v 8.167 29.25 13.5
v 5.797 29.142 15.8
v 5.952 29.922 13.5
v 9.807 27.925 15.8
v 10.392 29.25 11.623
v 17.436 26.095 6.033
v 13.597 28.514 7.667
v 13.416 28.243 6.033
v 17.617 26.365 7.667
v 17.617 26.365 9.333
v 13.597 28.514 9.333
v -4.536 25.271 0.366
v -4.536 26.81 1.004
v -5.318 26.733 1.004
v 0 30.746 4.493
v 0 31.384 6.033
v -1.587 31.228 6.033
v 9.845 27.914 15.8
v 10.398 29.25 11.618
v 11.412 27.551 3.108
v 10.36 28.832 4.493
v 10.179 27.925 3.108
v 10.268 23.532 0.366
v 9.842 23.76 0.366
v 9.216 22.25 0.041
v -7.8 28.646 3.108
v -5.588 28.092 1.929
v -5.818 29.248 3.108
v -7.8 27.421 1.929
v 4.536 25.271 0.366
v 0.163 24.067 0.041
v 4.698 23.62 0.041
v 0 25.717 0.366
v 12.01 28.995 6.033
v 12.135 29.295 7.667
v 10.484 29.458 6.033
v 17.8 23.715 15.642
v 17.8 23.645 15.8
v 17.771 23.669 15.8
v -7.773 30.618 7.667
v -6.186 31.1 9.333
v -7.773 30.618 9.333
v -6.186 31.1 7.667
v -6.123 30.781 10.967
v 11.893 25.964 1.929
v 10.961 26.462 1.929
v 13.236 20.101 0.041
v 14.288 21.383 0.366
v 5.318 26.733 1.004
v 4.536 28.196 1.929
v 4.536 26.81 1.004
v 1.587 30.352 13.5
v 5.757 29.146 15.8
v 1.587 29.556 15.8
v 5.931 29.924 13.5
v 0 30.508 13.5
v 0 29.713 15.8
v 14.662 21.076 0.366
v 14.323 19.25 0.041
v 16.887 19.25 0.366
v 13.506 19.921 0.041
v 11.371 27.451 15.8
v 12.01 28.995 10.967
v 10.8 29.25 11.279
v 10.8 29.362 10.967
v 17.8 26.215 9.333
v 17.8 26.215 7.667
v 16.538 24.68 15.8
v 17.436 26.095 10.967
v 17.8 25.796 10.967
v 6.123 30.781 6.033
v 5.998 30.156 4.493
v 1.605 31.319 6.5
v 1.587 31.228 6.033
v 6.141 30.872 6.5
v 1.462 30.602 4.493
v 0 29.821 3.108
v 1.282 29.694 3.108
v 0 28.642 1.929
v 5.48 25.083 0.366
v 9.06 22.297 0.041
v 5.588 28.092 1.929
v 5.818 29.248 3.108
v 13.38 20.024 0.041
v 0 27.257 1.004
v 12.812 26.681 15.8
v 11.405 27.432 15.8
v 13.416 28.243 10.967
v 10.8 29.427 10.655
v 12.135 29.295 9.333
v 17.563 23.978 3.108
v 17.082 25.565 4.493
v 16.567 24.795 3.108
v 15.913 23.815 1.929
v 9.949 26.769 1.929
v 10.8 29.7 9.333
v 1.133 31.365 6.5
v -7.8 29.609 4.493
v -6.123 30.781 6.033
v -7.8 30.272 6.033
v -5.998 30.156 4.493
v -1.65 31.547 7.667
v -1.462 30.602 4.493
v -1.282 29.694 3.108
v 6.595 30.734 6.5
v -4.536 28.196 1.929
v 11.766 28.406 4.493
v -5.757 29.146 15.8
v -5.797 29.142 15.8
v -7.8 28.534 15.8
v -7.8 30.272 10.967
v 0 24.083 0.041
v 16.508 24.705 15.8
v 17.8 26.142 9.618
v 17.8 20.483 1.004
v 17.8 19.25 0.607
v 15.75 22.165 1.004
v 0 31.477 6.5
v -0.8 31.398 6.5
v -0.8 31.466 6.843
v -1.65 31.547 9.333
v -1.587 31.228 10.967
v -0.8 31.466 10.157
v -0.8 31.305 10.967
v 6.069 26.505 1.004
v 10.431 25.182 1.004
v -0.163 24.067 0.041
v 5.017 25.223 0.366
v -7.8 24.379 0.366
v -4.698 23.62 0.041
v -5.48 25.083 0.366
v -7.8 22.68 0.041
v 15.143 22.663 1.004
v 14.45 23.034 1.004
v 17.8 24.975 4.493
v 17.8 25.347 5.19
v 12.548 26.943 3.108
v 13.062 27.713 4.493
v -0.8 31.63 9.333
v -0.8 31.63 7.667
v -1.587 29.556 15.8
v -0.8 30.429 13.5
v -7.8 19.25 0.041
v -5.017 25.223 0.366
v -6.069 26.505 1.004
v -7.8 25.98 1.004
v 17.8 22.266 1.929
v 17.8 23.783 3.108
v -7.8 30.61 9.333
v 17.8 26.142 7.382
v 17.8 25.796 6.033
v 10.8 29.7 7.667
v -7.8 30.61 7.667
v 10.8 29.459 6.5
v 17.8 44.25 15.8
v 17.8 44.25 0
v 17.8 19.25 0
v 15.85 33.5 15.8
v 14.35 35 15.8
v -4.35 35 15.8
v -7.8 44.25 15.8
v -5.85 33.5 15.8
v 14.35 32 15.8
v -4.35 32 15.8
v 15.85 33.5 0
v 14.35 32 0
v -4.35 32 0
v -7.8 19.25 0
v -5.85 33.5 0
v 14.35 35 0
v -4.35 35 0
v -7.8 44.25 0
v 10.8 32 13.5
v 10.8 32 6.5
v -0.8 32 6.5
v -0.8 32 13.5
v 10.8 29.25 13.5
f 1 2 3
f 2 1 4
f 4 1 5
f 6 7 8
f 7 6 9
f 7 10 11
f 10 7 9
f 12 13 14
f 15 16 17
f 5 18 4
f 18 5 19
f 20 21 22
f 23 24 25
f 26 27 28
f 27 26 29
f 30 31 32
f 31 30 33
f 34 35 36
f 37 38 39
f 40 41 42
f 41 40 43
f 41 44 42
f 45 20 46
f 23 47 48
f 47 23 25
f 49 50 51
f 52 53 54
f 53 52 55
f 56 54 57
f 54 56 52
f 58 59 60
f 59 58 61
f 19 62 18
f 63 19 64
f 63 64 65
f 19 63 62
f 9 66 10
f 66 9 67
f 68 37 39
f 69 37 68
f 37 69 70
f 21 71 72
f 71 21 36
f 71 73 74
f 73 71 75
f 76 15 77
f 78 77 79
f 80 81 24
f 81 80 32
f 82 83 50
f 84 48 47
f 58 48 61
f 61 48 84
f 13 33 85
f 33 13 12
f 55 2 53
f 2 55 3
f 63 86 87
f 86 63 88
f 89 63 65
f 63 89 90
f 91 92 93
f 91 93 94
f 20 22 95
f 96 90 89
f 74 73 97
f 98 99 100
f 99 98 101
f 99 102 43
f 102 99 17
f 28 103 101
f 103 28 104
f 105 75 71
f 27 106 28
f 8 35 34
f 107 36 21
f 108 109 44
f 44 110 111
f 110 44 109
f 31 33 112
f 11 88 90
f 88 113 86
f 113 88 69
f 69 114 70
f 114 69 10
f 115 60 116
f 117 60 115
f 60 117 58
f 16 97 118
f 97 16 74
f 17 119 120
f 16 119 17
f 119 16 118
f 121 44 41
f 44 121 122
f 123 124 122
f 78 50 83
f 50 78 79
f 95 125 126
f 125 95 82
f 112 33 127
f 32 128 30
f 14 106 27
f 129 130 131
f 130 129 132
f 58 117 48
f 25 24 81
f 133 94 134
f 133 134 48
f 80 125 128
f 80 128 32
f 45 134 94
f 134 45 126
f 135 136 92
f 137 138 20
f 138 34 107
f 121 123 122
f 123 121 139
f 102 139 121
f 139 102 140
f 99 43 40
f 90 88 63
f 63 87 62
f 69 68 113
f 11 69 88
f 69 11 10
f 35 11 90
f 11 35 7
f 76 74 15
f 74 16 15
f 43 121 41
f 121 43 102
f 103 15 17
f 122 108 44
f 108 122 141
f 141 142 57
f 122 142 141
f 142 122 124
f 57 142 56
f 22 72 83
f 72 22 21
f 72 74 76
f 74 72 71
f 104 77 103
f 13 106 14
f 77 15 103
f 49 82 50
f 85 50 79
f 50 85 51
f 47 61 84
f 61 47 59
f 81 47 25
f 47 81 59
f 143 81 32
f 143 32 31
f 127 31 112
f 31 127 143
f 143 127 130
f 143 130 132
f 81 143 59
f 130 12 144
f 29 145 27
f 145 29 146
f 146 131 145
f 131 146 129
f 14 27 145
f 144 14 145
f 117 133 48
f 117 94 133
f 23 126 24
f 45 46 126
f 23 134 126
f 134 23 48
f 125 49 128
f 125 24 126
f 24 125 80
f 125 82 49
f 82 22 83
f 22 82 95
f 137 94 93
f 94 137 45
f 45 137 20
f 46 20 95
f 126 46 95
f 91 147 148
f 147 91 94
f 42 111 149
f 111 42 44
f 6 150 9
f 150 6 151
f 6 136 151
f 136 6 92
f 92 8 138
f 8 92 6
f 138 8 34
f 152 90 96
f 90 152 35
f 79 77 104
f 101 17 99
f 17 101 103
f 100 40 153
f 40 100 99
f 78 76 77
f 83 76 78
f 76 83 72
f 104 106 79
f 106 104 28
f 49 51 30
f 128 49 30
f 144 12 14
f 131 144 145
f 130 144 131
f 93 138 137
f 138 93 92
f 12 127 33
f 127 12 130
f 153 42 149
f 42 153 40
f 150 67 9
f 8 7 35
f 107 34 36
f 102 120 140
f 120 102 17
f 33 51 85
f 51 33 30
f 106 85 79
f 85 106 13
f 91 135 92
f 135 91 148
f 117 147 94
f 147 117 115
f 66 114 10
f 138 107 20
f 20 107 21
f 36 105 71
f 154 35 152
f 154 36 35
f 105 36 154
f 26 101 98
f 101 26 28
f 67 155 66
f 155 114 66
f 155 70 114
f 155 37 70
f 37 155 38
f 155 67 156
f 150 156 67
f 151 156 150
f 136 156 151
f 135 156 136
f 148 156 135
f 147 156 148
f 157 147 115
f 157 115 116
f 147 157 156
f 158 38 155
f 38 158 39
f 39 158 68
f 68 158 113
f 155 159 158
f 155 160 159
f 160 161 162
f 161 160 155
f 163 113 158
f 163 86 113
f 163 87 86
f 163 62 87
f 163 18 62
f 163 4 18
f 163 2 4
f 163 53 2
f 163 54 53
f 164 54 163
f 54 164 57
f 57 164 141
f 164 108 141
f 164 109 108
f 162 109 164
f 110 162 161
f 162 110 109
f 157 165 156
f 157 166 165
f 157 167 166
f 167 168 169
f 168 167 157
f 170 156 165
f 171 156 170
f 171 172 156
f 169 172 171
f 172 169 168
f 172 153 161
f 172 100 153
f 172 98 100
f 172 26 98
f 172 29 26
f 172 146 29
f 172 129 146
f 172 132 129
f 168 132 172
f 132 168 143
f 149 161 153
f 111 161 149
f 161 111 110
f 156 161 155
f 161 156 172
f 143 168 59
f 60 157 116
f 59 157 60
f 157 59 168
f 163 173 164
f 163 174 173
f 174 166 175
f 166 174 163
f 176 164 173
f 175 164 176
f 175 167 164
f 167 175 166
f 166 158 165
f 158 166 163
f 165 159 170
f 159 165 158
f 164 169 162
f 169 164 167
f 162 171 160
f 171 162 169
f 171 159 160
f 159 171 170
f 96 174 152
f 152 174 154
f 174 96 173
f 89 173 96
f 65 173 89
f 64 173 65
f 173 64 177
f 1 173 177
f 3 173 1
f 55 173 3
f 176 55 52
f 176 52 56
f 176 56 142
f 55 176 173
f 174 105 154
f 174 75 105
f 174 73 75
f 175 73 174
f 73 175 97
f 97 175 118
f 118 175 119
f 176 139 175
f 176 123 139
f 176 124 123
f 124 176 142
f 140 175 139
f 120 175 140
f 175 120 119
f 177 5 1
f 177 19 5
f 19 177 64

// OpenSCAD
use <utilities.scad>;

// Mount for the light sensor to be used with conical flask

flask_max_r = 63.5/2; //maximum radius of flask
flask_ramp_h = 60; //height of sloping part of flask
flask_min_r = 22/2; //minimum radius of flask
flask_roc = 8.5; //radius of curvature of bottom
flask_neck_h = 32;

pcb_w = 20.4-0.8;
pcb_t = 1.5;
led_h = 1.3-0.3;
pcb_h = 20.8;

w = pcb_w + 2*3;
b = 25;
h = pcb_h - 5;

d=0.05;
$fn=32;

module conical_flask(){
    union(){
        minkowski(){
            $fn=32;
            translate([0,0,flask_roc]) cylinder(r1=flask_max_r-flask_roc,r2=flask_min_r-flask_roc,h=flask_ramp_h);
            sphere(r=flask_roc);
        }
        translate([0,0,flask_ramp_h+flask_roc-d]) cylinder(r=flask_min_r,h=flask_neck_h);
    }
}

module pcb_holder(){
    difference(){
        translate([-w/2,flask_max_r-b/2,0]) cube([w,b,h]);
        
        translate([-5,0,0]) #conical_flask();
        
        // cutout for PCB
        hull() reflect([1,0,0]) translate([-pcb_w/2+pcb_t/2-0.3,flask_max_r + led_h + pcb_t/2,0]) 
            rotate(45) cube([1,1,999] * pcb_t*sqrt(2), center=true);
        
        // cutout for optical access
        translate([0,flask_max_r,10]) cube([pcb_w - 8, (led_h+pcb_t) * 2, 7], center=true);
    }
}

module led_holder(){
    w = 15;
    h = 15;
    b = 25;
    rotate(180) difference(){
        translate([-w/2,flask_max_r-b/2,0]) cube([w,b,h]);
        
        #conical_flask();
        
        
        // cutout for LED
        translate([0,0,10]) cylinder_with_45deg_top(r=3/2*1.15, h=999, center=true, extra_height=0.3);
        translate([0,flask_max_r+5,10]) cylinder_with_45deg_top(r=4.5/2*1.15, h=999, extra_height=0.3);
    }
}

translate([5,0,0]) pcb_holder();
//led_holder();
